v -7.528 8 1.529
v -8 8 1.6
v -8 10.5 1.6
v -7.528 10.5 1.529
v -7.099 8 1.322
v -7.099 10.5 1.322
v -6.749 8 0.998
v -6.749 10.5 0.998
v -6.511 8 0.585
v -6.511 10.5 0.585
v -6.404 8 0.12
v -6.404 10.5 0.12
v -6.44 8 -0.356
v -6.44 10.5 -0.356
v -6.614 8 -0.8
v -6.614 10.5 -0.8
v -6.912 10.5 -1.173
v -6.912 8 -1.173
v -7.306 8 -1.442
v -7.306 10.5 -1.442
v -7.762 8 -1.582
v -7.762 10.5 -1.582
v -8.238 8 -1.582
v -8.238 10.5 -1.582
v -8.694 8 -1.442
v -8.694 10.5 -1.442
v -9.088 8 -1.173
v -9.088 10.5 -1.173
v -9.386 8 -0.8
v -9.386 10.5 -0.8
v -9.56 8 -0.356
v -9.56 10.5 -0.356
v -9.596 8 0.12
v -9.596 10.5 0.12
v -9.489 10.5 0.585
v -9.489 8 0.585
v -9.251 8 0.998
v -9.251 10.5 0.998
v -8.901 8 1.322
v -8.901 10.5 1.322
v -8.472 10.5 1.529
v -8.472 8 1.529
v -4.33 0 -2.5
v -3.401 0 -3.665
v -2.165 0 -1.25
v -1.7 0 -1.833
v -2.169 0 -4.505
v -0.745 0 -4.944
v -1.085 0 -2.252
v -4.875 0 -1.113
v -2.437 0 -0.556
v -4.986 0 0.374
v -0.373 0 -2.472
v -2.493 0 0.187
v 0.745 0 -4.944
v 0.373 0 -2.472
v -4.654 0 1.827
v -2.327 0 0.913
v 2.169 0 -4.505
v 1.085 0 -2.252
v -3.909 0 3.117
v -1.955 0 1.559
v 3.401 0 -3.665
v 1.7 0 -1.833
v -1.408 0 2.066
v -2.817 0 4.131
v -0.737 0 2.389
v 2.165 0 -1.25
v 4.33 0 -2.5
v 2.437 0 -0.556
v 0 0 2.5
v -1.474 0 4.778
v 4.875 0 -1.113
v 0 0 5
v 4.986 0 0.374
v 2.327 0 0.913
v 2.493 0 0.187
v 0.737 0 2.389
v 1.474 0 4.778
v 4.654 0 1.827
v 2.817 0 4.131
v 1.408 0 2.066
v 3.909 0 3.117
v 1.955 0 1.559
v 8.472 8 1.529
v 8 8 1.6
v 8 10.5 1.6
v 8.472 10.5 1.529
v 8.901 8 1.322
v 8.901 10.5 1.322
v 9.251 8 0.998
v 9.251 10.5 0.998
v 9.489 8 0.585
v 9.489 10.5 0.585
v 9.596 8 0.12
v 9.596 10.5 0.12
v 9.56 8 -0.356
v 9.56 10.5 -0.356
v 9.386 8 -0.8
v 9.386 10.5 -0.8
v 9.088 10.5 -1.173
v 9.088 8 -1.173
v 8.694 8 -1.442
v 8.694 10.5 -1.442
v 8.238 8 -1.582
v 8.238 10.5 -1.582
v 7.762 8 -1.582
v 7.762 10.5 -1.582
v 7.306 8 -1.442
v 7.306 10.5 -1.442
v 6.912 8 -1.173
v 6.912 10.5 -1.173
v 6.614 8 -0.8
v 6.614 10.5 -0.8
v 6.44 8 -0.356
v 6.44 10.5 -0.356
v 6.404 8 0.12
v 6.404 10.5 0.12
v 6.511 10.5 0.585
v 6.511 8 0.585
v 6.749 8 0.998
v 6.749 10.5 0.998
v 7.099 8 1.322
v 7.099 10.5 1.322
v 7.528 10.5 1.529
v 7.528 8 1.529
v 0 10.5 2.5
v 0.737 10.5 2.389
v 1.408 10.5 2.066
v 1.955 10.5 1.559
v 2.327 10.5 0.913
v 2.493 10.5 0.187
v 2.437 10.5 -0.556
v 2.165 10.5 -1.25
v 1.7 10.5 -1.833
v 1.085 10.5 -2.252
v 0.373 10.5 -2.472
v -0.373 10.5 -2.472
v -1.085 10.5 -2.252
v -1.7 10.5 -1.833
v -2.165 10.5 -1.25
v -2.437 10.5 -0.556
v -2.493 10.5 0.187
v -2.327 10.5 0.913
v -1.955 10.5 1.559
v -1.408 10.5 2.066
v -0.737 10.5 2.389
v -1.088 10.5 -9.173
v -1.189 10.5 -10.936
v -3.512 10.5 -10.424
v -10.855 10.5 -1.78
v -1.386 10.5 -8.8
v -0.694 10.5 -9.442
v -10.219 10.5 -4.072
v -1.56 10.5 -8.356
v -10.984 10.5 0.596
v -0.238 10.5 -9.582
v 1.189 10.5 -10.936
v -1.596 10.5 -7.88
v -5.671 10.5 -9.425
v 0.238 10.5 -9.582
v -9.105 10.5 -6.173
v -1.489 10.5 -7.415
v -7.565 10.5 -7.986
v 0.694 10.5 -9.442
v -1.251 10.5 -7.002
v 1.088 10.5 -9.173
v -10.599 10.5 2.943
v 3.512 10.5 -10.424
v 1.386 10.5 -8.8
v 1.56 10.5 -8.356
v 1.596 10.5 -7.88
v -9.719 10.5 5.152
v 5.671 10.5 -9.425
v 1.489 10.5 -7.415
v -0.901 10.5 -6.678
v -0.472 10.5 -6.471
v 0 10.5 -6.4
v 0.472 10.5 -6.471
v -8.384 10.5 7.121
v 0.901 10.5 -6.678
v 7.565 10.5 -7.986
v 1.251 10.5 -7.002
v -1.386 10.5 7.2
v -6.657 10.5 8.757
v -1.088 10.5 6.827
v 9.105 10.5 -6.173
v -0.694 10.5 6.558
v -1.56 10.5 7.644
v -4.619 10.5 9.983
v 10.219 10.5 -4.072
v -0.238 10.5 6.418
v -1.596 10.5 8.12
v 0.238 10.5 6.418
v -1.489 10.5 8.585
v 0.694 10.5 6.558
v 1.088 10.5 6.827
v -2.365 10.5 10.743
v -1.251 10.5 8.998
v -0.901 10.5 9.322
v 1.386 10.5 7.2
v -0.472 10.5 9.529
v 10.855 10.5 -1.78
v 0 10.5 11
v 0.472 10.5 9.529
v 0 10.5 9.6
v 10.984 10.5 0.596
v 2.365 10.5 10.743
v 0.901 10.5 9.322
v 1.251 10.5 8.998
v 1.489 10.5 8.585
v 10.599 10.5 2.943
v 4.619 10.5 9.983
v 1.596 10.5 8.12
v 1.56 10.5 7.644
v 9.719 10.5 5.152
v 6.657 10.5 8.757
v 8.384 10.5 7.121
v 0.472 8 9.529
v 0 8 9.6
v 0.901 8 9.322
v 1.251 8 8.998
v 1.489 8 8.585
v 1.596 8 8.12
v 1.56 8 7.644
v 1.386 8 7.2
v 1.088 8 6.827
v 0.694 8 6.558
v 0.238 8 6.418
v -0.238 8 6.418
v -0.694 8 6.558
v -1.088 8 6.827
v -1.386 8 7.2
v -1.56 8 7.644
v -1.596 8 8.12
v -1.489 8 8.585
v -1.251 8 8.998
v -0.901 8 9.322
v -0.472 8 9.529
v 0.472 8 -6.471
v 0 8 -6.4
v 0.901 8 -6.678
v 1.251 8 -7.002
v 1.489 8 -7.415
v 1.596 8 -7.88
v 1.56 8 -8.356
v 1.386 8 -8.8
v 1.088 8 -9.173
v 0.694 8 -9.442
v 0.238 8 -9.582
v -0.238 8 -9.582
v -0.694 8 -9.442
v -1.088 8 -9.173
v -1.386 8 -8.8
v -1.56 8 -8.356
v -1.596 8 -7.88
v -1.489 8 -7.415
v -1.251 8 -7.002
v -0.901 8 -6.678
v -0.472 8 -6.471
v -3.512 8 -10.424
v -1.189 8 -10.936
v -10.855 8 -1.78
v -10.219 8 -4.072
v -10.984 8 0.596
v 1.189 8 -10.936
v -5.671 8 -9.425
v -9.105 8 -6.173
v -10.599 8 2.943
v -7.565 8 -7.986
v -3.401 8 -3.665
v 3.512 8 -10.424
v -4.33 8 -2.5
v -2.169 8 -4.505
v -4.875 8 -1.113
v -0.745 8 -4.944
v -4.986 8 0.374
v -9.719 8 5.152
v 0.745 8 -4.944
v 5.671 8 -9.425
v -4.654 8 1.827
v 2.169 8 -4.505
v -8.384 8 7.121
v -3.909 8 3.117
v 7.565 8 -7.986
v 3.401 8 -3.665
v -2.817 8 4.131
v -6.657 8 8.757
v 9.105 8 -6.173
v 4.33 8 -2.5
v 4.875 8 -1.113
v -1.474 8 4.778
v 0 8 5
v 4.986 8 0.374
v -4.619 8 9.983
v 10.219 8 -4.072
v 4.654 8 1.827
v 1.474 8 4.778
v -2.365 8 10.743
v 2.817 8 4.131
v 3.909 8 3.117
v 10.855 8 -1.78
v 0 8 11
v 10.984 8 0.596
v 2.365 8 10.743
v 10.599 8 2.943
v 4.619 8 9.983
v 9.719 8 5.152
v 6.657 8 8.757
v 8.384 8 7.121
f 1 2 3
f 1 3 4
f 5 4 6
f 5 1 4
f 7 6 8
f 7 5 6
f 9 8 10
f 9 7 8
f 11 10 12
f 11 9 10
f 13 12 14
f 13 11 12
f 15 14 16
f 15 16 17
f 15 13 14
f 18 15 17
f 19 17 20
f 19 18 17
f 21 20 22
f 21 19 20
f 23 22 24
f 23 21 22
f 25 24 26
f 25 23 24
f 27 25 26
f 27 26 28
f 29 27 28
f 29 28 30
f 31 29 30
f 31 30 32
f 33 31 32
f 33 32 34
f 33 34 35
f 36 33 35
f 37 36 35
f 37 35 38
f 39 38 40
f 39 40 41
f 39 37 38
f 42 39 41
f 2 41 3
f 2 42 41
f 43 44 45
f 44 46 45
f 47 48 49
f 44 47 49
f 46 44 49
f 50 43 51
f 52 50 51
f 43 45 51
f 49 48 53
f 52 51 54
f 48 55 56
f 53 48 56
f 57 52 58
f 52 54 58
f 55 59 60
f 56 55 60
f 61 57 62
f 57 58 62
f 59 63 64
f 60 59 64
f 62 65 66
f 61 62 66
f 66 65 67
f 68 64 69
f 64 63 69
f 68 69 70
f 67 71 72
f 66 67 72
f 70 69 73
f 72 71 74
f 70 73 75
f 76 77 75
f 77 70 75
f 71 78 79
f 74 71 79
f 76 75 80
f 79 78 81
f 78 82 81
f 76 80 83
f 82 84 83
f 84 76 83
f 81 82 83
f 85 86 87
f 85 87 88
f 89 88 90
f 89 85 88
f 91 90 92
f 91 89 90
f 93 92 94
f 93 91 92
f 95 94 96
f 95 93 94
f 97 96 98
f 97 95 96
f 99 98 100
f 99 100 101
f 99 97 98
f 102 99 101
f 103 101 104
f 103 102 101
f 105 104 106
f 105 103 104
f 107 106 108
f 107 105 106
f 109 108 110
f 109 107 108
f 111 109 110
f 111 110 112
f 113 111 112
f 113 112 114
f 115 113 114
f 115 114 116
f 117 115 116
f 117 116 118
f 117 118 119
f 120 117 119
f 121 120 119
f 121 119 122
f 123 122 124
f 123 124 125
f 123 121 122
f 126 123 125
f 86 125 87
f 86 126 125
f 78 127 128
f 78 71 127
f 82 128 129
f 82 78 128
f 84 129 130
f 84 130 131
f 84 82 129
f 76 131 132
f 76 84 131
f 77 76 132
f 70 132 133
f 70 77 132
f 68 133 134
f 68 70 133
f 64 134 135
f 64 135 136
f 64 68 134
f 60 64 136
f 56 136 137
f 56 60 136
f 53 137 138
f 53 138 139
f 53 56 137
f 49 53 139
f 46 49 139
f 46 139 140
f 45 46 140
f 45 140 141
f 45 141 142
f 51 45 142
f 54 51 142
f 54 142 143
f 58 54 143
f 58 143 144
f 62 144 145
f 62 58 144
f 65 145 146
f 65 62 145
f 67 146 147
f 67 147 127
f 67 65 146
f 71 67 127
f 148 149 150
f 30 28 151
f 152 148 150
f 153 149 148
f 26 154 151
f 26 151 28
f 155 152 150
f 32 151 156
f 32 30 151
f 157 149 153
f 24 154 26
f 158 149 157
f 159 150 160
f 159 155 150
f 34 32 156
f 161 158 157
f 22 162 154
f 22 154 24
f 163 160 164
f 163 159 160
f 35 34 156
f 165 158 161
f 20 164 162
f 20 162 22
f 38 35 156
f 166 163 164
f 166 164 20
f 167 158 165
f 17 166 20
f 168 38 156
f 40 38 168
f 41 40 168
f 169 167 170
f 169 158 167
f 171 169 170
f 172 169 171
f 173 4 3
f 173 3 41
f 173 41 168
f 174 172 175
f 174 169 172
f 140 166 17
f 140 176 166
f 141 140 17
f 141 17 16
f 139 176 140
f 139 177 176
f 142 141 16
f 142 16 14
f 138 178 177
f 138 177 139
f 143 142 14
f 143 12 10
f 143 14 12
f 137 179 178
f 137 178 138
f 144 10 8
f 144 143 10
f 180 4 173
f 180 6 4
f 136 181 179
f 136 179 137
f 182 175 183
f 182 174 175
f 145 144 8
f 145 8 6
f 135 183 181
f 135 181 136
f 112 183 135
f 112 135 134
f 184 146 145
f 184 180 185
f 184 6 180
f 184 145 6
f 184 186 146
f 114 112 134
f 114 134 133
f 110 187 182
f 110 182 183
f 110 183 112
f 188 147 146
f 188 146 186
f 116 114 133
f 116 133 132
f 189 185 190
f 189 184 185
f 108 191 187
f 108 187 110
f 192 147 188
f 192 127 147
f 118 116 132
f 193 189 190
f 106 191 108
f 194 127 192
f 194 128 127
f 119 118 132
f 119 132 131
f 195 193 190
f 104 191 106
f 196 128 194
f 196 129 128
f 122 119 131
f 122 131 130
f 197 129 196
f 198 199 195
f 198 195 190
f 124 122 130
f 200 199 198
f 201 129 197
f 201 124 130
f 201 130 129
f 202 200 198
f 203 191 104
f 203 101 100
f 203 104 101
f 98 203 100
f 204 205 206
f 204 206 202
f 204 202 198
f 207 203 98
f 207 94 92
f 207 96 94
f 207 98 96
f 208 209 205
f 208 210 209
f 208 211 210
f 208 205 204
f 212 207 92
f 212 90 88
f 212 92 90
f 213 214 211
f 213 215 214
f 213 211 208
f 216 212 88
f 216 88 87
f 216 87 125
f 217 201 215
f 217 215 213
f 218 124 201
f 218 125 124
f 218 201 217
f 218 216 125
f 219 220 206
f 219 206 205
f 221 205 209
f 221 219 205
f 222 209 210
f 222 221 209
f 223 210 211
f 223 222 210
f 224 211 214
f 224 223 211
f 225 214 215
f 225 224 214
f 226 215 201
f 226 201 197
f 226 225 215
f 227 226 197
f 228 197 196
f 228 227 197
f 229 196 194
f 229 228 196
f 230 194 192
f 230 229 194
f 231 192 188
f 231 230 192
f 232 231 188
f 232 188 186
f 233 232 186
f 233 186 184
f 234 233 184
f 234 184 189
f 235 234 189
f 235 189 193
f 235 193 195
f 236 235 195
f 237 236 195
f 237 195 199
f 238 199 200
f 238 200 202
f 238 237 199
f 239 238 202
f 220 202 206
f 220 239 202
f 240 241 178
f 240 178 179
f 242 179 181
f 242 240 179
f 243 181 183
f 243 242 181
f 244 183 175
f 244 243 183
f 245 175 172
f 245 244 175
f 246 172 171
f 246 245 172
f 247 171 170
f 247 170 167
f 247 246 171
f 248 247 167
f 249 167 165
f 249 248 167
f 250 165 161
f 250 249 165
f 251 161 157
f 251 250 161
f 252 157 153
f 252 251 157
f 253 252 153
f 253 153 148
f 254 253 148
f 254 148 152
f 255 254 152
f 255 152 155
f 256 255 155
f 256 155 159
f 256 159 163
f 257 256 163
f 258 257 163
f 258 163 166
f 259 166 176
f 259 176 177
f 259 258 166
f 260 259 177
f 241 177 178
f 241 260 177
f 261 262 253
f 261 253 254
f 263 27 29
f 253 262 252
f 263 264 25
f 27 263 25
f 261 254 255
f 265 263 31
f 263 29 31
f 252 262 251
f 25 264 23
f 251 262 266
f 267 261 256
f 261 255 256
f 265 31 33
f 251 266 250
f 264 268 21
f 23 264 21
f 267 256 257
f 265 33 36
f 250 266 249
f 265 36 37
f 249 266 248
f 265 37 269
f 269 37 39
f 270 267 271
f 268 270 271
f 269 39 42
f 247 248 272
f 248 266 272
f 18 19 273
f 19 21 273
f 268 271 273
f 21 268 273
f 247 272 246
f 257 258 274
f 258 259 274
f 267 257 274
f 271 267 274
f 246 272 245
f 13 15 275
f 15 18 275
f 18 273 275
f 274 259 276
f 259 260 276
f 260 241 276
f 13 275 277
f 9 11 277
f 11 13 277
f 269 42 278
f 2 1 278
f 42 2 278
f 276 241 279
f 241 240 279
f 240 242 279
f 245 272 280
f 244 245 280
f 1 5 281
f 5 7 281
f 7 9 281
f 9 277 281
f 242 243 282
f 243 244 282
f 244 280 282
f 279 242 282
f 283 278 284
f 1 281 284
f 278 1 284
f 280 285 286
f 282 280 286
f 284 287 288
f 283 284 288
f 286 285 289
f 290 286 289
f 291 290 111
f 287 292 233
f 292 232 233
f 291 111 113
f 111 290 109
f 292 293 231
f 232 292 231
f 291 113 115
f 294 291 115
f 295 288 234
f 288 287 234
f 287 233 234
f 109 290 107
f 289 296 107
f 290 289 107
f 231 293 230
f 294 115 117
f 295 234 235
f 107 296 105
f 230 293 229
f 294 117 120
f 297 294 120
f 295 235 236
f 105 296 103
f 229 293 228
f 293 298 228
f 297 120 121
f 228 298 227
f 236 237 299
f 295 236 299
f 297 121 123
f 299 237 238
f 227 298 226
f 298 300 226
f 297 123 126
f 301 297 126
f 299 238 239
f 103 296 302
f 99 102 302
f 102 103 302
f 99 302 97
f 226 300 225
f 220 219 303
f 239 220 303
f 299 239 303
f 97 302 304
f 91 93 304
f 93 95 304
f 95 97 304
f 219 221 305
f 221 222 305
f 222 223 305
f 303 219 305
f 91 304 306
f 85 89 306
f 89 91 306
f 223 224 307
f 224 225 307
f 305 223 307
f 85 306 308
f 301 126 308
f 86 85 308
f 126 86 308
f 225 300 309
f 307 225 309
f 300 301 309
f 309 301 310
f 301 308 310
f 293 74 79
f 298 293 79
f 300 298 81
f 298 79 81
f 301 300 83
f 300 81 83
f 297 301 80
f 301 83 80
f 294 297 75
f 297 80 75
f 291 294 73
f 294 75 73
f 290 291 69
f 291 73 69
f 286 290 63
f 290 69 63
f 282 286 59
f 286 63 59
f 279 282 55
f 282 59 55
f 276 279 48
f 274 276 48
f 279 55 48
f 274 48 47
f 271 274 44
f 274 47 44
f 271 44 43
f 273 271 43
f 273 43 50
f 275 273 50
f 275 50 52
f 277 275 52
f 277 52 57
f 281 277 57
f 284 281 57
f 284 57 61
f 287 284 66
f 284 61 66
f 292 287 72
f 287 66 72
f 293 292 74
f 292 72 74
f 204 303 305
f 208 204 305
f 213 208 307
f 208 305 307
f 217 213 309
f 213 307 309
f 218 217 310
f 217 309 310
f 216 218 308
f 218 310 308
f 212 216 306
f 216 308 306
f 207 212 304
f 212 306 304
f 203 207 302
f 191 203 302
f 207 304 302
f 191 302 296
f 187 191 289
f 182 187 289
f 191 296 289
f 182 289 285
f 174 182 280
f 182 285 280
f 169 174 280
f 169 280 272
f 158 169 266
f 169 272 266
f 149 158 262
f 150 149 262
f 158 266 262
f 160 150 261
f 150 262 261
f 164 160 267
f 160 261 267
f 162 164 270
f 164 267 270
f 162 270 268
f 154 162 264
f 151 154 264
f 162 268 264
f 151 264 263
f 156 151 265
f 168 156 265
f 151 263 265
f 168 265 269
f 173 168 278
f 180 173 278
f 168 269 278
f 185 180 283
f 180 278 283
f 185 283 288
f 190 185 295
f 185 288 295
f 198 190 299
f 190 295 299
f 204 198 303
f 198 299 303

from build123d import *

# Parameters (mm, degrees)
SKETCH_1_R      = 5
SKETCH_1_R_2    = 2.5
EXTRUDE_1_DEPTH = 8
SKETCH_2_R      = 11
SKETCH_2_R_2    = 2.5
SKETCH_2_R_3    = 1.6
EXTRUDE_2_DEPTH = 2.5


with BuildPart() as part:
    # 草图1 → 凸台-拉伸1 (new body)
    with BuildSketch(Plane(origin=(0, 0, 0), x_dir=(1, 0, 0), z_dir=(0, 1, 0))):
        with Locations(Location((0, 0, 0), (0, 0, 270))):
            Circle(SKETCH_1_R)
        with Locations(Location((0, 0, 0), (0, 0, 270))):
            Circle(SKETCH_1_R_2, mode=Mode.SUBTRACT)
    extrude(amount=EXTRUDE_1_DEPTH)

    # 草图2 → 凸台-拉伸2 (add)
    with BuildSketch(Plane(origin=(0, 8, 0), x_dir=(-1, 0, 0), z_dir=(0, 1, 0))):
        with Locations(Location((0, 0, 0), (0, 0, 90))):
            Circle(SKETCH_2_R)
        with Locations(Location((0, 0, 0), (0, 0, 90))):
            Circle(SKETCH_2_R_2, mode=Mode.SUBTRACT)
        with Locations(Location((-8, 0, 0), (0, 0, 90))):
            Circle(SKETCH_2_R_3, mode=Mode.SUBTRACT)
        with Locations(Location((0, 8, 0), (0, 0, 90))):
            Circle(SKETCH_2_R_3, mode=Mode.SUBTRACT)
        with Locations(Location((8, 0, 0), (0, 0, 90))):
            Circle(SKETCH_2_R_3, mode=Mode.SUBTRACT)
        with Locations(Location((0, -8, 0), (0, 0, 90))):
            Circle(SKETCH_2_R_3, mode=Mode.SUBTRACT)
    extrude(amount=EXTRUDE_2_DEPTH)


solid = part.part
